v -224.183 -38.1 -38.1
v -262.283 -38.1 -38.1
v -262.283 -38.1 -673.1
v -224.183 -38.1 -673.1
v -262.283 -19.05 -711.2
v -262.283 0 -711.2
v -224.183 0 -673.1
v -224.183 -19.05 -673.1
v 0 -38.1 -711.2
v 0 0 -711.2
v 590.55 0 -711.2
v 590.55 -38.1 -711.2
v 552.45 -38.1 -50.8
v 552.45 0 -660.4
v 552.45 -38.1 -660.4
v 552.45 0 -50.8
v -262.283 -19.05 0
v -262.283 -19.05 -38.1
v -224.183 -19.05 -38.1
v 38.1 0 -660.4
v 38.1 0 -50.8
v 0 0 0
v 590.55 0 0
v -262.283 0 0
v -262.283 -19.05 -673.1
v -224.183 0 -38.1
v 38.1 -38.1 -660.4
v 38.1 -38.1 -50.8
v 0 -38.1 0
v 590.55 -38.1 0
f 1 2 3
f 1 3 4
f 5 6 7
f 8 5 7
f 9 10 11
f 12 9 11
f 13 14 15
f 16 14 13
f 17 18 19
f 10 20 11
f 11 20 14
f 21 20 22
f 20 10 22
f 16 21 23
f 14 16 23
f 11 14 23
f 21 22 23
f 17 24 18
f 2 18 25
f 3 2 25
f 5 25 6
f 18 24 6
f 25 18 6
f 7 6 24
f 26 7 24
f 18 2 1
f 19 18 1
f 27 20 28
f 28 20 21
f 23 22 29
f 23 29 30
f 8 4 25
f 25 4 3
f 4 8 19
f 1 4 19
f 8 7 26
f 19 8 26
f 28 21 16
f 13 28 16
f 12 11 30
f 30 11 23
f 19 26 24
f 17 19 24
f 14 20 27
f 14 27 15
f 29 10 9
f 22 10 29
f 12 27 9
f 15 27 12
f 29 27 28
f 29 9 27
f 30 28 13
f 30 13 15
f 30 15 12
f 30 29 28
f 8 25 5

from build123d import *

# Parameters (mm, degrees)
F0_W     = 590.55
F0_H     = 711.2
F0_W_2   = 514.35
F0_H_2   = 609.6
F1_DEPTH = 38.1
F3_DEPTH = 38.1
F5_DEPTH = 19.05


with BuildPart() as f1:
    # F0 (on Front) → F1 (new body)
    with BuildSketch(Plane.XZ):
        with Locations((295.275, -355.6)):
            Rectangle(F0_W, F0_H)
        with Locations((295.275, -355.6)):
            Rectangle(F0_W_2, F0_H_2, mode=Mode.SUBTRACT)
    extrude(amount=F1_DEPTH)


with BuildPart() as f3:
    # F2 (on Front) → F3 (new body)
    with BuildSketch(Plane.XZ):
        Polygon((-224.182675, -38.1), (-262.282675, 0), (-262.282675, -711.2), (-224.182675, -673.1), align=None)
    extrude(amount=F3_DEPTH)

    # F4 (on face) → F5 (cut)
    with BuildSketch(Plane.XZ.offset(38.1)):
        Polygon((-262.282675, -711.2), (-224.182675, -673.1), (-262.282675, -673.1), align=None)
        Polygon((-224.182675, -38.1), (-262.282675, 0), (-262.282675, -38.1), align=None)
    extrude(amount=-F5_DEPTH, mode=Mode.SUBTRACT)


solid = Compound([f1.part, f3.part])
